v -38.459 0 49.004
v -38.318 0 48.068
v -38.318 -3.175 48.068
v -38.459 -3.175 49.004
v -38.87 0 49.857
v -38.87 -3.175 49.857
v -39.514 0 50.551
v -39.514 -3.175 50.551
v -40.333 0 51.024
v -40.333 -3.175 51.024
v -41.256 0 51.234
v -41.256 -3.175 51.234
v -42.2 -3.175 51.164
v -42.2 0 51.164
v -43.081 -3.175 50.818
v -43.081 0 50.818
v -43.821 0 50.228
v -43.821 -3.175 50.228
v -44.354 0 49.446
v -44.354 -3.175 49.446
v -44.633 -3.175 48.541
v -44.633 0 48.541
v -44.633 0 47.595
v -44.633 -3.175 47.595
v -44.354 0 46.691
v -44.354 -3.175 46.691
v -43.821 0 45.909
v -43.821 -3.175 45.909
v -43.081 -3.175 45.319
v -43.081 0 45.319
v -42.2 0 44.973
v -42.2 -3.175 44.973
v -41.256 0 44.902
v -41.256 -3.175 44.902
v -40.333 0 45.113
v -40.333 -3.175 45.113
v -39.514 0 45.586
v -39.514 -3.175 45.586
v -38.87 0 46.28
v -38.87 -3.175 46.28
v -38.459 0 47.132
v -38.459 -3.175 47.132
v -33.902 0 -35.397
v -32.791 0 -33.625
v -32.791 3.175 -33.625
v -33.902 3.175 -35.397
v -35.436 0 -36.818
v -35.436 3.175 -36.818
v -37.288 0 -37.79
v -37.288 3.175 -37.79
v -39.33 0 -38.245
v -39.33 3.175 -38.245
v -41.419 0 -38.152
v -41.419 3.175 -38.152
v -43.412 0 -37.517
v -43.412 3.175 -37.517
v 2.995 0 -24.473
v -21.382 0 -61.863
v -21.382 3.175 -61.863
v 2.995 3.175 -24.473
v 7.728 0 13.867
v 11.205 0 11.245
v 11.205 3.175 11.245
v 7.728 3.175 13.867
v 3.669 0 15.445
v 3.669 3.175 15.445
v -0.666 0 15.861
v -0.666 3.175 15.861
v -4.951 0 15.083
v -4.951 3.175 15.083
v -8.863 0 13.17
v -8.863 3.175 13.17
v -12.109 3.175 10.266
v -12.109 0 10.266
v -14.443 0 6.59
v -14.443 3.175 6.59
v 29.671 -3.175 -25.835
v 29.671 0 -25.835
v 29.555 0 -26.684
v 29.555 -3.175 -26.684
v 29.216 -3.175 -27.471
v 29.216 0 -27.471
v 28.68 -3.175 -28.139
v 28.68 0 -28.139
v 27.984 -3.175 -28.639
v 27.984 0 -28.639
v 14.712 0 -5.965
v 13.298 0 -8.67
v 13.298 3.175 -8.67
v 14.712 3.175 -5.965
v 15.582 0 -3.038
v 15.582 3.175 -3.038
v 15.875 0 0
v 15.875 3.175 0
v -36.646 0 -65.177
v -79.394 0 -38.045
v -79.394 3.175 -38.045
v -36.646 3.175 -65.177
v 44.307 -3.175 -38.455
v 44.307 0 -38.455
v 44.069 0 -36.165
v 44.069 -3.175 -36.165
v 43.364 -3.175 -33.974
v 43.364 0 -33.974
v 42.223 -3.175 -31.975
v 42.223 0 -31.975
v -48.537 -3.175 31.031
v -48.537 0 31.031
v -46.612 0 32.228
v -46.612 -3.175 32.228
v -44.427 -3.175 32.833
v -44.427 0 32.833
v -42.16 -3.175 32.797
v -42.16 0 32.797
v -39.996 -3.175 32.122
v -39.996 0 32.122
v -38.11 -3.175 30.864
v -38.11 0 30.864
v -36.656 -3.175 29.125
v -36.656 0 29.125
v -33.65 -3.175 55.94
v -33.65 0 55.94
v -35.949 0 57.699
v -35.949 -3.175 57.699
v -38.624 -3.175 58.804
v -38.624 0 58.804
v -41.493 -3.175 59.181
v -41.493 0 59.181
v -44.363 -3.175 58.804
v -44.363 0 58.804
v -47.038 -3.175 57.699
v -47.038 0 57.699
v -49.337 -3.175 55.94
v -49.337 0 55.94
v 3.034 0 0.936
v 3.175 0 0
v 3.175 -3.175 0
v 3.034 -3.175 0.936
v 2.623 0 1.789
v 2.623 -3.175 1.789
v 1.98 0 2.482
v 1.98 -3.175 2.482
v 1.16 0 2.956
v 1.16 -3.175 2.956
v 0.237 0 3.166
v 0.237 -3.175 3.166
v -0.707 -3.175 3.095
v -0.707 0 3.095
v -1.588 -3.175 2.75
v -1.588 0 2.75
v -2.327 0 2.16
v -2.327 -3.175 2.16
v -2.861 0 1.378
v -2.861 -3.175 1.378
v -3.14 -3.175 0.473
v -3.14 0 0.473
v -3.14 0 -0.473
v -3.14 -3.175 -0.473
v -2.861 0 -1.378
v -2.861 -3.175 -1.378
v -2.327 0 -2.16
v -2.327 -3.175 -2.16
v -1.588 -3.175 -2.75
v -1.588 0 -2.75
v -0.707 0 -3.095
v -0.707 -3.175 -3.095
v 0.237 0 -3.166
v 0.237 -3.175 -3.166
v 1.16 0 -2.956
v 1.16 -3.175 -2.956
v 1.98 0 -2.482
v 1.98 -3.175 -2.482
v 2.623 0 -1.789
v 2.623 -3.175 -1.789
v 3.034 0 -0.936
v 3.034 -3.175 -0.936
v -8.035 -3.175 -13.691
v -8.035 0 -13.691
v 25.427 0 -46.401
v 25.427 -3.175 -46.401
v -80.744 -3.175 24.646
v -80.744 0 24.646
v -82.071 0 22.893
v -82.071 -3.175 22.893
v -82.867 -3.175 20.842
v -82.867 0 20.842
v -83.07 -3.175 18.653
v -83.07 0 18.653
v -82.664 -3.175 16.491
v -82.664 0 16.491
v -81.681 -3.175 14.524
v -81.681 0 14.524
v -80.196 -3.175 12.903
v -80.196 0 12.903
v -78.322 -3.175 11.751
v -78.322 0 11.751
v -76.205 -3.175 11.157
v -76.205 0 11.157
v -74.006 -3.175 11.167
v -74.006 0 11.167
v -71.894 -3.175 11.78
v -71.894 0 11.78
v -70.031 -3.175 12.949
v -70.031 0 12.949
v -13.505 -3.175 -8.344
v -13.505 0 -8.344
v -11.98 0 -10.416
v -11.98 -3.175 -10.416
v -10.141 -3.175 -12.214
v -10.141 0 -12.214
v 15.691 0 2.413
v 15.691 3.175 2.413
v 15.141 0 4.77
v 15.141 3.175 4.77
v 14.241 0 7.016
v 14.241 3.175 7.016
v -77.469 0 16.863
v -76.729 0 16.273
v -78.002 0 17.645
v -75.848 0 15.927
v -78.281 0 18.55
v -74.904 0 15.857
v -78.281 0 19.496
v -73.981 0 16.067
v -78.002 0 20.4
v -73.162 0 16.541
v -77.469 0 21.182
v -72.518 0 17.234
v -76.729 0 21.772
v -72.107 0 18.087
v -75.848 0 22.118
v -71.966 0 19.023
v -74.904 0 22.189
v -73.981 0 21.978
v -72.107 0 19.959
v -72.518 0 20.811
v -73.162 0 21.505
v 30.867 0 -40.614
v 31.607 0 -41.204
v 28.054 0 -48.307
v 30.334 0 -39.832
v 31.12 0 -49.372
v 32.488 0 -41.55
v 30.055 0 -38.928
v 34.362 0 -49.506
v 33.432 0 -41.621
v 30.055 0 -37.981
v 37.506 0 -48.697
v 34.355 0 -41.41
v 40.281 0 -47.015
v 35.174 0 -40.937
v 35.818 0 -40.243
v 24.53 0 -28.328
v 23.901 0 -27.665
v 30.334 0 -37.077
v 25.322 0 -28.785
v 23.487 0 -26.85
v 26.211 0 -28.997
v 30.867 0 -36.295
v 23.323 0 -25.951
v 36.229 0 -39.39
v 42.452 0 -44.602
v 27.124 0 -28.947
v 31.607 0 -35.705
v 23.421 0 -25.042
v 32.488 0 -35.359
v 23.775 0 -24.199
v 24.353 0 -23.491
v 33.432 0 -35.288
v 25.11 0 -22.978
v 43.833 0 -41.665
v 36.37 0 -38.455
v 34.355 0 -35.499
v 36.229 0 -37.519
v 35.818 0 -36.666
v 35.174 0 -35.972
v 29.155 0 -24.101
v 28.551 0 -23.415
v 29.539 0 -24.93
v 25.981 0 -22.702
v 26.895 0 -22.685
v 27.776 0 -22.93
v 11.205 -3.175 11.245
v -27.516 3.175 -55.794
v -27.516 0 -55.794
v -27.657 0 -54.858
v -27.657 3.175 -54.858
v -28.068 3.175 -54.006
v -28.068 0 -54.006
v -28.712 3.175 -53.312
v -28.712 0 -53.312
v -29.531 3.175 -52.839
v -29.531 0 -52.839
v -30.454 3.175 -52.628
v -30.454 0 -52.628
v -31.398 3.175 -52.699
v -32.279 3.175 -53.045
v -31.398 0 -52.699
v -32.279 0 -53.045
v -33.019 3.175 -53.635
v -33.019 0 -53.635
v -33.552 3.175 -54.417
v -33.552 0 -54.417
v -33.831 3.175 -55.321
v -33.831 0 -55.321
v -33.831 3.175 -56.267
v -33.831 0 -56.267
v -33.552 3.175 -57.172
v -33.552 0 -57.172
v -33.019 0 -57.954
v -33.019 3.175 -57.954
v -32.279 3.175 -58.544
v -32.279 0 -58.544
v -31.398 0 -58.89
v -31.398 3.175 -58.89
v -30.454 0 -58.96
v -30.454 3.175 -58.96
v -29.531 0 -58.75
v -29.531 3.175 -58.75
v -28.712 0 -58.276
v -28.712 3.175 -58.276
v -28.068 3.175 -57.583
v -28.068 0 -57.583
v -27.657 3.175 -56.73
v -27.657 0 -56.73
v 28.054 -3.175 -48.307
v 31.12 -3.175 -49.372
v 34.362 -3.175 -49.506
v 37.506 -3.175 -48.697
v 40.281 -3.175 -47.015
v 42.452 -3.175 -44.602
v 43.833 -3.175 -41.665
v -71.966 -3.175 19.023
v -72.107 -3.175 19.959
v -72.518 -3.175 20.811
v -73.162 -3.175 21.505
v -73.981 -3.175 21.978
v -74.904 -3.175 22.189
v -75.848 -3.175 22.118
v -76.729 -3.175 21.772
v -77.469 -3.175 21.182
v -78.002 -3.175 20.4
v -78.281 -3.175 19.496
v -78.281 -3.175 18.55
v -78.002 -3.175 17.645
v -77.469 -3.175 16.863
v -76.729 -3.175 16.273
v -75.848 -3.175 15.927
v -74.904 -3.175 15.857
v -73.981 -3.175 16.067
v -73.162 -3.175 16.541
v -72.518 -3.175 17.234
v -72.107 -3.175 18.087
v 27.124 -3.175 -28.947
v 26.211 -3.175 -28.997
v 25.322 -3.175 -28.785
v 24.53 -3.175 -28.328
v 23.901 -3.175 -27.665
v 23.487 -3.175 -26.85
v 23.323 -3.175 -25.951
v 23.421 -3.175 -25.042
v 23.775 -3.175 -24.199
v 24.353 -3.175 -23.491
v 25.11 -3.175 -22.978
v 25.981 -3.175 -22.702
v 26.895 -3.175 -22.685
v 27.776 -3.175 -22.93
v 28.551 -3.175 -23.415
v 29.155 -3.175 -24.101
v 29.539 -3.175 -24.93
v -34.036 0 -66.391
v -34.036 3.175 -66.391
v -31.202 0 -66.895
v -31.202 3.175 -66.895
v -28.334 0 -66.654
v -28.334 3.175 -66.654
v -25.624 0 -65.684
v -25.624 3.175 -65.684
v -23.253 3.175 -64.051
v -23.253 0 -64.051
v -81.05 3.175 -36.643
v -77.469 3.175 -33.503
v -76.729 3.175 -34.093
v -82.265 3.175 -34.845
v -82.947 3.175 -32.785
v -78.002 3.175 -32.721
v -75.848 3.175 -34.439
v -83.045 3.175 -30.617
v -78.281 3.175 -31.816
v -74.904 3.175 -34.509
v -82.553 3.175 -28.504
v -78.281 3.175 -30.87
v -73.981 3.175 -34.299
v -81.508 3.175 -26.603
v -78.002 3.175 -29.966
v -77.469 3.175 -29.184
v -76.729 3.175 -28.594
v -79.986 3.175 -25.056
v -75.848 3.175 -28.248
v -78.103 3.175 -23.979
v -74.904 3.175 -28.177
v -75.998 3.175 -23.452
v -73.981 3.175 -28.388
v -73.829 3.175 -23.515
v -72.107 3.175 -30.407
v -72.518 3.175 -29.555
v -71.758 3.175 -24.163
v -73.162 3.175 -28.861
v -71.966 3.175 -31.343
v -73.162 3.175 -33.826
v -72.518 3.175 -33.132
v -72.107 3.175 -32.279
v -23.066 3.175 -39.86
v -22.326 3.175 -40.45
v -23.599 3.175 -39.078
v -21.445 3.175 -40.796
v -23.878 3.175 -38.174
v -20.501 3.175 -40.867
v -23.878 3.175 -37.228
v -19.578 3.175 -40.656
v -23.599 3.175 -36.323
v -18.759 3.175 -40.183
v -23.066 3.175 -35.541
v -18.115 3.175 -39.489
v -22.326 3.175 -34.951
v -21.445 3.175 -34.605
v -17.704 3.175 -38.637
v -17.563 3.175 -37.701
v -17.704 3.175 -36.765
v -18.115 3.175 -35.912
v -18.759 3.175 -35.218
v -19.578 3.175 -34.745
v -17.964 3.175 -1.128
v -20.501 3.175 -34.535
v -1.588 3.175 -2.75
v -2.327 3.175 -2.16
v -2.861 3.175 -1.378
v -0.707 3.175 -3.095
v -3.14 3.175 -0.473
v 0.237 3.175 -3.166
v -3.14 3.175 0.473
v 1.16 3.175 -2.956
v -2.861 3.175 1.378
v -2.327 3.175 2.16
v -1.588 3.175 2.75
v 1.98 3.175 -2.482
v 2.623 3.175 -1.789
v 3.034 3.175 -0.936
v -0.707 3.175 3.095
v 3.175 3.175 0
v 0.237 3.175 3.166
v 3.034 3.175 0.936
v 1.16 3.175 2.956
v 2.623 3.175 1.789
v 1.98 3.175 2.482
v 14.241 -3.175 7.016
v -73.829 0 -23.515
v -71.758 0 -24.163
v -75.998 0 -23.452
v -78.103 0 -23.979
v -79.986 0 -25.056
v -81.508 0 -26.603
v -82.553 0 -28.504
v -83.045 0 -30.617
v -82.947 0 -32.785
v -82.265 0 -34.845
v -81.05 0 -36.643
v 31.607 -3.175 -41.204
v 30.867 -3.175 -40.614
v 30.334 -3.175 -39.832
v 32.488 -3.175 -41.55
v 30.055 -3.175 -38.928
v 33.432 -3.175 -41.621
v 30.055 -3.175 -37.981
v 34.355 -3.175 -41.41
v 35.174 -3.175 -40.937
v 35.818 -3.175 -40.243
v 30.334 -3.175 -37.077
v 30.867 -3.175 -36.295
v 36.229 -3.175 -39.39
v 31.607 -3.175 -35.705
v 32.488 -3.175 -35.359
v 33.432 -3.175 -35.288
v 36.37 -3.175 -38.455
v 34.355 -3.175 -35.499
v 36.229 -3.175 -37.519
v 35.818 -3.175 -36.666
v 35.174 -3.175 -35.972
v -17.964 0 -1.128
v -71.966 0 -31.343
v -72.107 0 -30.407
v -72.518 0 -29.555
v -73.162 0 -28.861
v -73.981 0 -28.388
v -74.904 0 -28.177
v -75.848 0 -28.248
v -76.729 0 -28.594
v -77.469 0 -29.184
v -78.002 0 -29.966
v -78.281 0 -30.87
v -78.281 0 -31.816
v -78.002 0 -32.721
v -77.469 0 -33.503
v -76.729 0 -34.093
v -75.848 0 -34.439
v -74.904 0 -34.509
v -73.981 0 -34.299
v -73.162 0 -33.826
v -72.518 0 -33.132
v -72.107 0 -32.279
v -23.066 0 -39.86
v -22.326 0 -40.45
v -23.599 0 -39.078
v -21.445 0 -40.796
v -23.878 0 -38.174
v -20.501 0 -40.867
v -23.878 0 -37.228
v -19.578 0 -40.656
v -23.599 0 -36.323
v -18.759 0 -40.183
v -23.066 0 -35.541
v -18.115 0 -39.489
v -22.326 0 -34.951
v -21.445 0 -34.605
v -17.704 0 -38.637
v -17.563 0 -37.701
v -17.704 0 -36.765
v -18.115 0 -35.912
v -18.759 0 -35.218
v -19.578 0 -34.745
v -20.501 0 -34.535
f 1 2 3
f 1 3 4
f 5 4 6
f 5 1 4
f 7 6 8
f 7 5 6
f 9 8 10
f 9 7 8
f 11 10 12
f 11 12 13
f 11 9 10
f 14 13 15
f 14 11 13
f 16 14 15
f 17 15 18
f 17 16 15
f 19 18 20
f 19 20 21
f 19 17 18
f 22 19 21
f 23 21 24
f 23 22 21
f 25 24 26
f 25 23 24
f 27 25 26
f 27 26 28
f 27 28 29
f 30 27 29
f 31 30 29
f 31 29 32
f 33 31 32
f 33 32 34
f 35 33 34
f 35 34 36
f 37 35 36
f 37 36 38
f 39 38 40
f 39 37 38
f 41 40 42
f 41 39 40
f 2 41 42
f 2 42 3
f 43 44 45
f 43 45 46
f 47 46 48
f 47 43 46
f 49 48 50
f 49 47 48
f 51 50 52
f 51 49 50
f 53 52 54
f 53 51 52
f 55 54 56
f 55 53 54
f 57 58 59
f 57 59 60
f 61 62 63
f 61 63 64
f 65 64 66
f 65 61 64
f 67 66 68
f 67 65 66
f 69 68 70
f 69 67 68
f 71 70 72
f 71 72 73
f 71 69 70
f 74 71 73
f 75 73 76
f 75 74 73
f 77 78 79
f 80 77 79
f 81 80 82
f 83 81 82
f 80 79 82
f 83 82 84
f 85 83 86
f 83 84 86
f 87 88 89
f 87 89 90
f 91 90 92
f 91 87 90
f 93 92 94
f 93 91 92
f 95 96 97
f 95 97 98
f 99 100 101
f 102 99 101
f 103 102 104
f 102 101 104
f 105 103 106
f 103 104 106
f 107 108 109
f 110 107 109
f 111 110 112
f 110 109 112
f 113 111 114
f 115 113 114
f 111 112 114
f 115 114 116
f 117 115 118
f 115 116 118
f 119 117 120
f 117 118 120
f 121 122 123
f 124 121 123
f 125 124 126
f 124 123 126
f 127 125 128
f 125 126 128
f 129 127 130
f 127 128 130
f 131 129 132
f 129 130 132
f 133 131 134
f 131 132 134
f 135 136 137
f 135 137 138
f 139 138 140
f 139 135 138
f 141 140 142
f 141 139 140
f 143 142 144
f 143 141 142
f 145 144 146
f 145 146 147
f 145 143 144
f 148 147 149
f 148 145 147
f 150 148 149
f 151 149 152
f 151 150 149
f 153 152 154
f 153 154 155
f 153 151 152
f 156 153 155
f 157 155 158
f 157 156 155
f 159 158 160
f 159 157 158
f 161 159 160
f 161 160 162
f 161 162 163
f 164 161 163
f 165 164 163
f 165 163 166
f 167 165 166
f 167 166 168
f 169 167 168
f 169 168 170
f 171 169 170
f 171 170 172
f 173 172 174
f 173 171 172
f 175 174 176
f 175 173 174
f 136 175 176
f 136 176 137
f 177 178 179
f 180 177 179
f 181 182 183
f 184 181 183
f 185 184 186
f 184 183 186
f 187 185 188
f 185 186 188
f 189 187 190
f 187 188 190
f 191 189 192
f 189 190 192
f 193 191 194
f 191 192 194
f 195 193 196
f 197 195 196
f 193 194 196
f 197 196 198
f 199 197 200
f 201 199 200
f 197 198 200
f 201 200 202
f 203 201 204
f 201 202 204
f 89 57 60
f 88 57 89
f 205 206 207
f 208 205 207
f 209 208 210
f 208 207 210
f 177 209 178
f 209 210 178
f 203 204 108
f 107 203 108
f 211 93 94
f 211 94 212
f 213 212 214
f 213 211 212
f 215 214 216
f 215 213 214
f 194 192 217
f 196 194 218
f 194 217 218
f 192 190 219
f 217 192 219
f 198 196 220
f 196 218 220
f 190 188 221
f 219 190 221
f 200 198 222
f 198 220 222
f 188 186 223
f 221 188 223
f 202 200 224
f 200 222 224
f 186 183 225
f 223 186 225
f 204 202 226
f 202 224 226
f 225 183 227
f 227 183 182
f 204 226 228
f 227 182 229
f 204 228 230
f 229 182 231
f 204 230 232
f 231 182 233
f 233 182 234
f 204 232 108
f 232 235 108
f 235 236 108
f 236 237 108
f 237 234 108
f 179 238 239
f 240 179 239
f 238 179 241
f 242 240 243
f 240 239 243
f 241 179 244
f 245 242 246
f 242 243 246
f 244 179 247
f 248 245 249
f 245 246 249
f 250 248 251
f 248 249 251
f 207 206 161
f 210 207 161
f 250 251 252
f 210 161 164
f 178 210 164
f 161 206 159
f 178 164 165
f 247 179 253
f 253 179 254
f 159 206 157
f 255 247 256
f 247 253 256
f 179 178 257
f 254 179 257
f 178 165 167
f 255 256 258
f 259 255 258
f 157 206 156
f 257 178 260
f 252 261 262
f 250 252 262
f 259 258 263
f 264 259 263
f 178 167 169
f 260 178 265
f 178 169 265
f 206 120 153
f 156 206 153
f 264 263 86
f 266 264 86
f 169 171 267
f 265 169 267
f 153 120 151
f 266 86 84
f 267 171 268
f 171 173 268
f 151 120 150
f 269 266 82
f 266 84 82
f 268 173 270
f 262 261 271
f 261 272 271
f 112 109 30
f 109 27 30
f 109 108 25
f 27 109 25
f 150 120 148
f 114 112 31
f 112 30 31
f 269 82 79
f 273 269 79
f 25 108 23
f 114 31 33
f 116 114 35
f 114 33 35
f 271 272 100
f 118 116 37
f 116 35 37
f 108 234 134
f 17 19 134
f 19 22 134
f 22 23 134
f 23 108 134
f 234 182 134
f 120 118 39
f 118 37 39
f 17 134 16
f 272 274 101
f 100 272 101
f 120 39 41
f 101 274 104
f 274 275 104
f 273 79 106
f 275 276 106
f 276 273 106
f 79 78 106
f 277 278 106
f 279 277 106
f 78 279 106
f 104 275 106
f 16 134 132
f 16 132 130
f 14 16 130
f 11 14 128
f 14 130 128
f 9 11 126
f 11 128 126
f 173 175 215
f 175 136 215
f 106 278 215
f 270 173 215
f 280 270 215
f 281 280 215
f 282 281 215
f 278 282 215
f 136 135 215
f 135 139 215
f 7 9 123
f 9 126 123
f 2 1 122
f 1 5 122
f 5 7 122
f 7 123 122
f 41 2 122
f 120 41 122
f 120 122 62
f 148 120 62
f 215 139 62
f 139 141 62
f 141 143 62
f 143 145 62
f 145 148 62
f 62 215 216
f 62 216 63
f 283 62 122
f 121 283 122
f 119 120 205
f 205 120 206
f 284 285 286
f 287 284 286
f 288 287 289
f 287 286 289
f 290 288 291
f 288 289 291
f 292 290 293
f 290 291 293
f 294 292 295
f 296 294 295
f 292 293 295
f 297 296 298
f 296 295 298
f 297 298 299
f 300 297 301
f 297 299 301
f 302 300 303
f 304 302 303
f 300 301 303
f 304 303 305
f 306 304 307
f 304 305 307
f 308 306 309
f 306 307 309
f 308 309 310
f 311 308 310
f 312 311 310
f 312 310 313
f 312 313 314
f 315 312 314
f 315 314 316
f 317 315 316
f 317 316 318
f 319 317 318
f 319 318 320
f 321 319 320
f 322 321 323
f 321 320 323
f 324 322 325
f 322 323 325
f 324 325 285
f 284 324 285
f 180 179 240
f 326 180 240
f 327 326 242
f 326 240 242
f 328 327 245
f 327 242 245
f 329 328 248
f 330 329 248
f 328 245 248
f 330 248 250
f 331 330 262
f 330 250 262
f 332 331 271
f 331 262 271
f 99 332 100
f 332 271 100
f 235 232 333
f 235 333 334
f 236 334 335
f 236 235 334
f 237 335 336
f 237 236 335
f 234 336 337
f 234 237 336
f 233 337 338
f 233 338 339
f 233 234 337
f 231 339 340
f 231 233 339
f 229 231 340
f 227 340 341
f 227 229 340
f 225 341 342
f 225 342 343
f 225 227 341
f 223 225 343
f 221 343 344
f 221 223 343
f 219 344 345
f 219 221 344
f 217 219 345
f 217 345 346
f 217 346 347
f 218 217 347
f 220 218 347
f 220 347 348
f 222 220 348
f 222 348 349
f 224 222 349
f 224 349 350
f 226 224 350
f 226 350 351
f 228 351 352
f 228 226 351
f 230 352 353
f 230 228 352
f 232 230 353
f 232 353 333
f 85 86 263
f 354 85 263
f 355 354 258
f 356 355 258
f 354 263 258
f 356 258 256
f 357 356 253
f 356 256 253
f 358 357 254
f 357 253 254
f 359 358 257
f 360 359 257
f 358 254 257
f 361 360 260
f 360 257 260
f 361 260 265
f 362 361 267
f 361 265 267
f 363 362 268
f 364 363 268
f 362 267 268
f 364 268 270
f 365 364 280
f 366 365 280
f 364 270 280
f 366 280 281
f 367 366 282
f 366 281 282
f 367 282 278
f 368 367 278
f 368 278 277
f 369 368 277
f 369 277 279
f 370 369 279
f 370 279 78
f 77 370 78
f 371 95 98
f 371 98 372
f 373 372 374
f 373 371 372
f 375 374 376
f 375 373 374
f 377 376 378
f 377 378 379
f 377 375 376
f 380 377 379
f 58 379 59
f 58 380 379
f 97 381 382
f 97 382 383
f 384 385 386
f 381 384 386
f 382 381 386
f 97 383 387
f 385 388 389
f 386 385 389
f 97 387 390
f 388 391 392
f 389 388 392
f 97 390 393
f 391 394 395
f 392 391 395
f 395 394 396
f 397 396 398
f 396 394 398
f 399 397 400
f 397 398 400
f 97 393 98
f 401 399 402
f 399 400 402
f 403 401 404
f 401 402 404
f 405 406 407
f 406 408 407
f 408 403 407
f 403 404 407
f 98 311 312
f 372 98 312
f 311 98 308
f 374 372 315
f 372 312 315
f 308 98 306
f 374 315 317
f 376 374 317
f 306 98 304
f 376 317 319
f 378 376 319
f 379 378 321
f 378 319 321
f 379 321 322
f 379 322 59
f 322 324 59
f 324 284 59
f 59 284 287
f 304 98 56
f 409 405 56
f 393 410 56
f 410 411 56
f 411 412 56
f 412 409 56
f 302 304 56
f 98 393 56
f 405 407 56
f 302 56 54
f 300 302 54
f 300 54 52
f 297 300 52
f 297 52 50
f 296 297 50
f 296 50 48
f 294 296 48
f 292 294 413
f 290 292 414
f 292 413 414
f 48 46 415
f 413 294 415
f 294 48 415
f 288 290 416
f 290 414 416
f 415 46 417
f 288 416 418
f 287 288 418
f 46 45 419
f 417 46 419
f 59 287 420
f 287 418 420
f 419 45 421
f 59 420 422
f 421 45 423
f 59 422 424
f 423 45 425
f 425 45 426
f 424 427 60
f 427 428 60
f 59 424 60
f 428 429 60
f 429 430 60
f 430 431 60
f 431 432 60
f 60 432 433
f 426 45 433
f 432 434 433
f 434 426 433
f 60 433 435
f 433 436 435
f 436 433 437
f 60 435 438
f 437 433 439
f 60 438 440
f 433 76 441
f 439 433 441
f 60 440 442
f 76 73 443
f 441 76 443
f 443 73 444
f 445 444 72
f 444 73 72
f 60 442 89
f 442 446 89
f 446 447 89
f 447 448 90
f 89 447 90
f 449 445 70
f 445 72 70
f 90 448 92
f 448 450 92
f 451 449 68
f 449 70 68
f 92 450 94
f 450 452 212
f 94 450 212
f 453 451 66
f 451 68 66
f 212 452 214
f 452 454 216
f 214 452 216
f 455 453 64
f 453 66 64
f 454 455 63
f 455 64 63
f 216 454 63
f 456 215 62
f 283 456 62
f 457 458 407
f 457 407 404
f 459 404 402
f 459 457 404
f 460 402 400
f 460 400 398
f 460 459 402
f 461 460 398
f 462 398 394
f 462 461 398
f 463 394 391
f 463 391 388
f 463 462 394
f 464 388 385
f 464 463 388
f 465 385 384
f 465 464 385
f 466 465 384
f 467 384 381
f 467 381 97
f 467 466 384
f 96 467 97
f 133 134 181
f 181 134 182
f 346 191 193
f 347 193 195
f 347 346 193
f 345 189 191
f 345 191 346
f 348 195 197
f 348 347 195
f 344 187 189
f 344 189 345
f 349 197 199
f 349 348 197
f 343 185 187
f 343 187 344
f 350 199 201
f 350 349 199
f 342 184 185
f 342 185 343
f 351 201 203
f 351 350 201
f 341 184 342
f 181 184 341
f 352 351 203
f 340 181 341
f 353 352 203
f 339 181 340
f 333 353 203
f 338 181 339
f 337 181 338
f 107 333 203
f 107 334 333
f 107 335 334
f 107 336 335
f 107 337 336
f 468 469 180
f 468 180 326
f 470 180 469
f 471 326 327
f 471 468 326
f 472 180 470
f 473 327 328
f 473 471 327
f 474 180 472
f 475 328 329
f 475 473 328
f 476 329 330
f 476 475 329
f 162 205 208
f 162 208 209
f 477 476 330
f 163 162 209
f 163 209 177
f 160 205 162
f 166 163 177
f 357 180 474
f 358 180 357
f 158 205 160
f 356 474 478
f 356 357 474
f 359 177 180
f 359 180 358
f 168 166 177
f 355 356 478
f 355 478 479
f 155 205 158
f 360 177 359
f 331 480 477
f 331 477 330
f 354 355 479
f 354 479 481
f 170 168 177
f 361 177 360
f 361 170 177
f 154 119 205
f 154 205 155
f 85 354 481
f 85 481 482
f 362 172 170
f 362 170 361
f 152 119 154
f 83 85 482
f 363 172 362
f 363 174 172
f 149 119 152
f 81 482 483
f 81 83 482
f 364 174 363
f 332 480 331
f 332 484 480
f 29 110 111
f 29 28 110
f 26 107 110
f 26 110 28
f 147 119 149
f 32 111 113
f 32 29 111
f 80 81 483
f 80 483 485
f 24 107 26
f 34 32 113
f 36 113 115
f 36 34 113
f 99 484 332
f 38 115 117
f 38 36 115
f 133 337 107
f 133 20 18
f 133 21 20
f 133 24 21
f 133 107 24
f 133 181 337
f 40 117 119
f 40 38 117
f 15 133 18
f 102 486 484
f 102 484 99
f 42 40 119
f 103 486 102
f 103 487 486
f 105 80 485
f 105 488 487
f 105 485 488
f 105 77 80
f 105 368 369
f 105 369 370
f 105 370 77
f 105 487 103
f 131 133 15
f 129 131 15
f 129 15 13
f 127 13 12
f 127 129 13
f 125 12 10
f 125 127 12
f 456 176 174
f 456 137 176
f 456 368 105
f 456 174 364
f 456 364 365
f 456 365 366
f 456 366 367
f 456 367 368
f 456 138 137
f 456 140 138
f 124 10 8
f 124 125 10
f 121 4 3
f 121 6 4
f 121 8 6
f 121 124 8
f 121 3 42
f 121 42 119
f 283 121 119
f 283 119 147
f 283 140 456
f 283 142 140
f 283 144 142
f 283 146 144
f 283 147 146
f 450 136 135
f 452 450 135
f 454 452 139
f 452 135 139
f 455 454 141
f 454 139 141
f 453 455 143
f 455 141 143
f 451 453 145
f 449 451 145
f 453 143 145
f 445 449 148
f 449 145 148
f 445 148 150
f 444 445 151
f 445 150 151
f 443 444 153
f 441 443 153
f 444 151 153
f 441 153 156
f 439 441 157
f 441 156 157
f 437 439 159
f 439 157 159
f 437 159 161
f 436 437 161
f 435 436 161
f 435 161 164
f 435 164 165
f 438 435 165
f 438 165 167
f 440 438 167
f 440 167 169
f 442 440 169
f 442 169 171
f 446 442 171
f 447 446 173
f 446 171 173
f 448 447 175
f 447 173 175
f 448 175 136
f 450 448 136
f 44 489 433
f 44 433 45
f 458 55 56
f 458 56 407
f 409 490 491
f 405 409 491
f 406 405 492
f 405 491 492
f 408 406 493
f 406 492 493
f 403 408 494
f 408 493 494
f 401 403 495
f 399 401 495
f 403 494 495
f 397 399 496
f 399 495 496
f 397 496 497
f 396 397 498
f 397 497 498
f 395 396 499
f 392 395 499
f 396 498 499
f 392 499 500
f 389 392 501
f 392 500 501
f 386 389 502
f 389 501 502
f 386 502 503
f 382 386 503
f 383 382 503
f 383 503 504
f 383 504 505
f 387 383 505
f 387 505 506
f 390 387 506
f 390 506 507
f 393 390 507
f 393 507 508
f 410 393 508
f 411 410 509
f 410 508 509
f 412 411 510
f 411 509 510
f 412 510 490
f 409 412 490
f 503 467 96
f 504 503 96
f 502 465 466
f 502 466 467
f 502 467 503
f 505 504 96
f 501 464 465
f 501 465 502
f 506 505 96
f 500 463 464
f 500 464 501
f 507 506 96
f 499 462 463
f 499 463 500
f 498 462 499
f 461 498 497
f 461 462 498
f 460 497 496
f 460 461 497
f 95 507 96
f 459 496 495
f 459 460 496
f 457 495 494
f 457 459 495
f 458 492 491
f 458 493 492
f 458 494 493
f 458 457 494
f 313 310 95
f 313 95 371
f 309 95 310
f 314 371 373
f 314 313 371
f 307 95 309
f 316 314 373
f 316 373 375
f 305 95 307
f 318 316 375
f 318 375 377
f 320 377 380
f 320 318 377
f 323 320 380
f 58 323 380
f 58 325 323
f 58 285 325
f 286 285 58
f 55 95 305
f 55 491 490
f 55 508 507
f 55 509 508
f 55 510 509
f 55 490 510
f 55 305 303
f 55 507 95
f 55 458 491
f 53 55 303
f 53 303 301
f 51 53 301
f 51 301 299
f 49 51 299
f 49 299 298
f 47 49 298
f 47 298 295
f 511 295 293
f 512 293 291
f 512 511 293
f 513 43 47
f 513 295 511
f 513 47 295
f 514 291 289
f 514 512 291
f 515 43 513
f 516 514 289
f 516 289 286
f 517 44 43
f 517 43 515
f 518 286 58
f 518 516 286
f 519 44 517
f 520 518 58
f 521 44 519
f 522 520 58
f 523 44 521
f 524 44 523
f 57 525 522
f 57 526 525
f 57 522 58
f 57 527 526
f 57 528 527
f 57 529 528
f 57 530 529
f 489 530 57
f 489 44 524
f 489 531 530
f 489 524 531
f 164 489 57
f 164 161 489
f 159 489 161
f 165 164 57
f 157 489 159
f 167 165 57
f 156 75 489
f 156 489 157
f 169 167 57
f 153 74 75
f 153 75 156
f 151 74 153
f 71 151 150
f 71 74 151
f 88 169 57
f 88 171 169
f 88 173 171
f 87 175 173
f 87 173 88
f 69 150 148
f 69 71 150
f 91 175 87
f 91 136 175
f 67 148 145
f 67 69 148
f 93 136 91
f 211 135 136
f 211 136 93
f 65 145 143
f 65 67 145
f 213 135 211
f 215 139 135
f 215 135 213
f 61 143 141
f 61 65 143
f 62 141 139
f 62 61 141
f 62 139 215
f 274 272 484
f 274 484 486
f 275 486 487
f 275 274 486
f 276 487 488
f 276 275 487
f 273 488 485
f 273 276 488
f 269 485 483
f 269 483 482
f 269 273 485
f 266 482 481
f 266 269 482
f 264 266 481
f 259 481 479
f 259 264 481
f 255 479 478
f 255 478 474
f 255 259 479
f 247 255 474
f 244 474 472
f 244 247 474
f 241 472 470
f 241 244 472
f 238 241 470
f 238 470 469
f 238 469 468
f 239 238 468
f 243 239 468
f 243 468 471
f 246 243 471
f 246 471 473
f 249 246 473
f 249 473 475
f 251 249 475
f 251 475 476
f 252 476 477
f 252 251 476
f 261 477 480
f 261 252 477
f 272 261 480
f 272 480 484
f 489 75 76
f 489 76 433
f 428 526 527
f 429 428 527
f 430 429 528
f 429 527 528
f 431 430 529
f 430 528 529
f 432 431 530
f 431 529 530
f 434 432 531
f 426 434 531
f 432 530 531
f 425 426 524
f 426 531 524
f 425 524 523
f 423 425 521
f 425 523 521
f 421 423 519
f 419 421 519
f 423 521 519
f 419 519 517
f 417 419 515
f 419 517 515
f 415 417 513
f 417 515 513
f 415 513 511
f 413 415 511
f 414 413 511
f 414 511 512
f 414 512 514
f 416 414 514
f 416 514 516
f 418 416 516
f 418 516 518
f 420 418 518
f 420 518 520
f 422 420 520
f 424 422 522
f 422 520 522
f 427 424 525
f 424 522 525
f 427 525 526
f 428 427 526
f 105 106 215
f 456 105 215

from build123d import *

# Parameters (mm, degrees)
F0_R     = 3.9751
F0_R_2   = 3.175
F1_DEPTH = 3.175
F2_DEPTH = 3.175


with BuildPart() as f1:
    # F0 (on Front) → F1 (new body)
    with BuildSketch(Plane.XZ):
        with BuildLine():
            ThreePointArc((-14.4427573847, 6.589566308), (-2.8354258051, 15.6197306476), (11.2052030012, 11.2454013135))
            Line((11.2052030012, 11.2454013135), (-33.6497130803, 55.9399770143))
            ThreePointArc((-33.6497130803, 55.9399770143), (-31.2305551467, 52.3299553211), (-30.3808551811, 48.0681960948))
            ThreePointArc((-30.3808551811, 48.0681960948), (-45.7551144074, 37.8053960604), (-49.336997282, 55.9399770143))
            Line((-49.336997282, 55.9399770143), (-80.7436939481, 24.6455481248))
            ThreePointArc((-80.7436939481, 24.6455481248), (-72.0969787145, 26.3534189212), (-67.2035924475, 19.022847468))
            ThreePointArc((-67.2035924475, 19.022847468), (-67.945184229, 15.6728010265), (-70.0313873855, 12.9487367982))
            Line((-70.0313873855, 12.9487367982), (-48.5368082432, 31.0305541734))
            ThreePointArc((-48.5368082432, 31.0305541734), (-42.1602348474, 32.7966531084), (-36.6555025797, 29.1254521629))
            Line((-36.6555025797, 29.1254521629), (-17.9638112387, -1.1277437812))
            Line((-17.9638112387, -1.1277437812), (-14.4427573847, 6.589566308))
        make_face()
        with BuildLine():
            Line((14.2405382677, 7.0158887425), (11.2052030012, 11.2454013135))
            ThreePointArc((11.2052030012, 11.2454013135), (-2.8354258051, 15.6197306476), (-14.4427573847, 6.589566308))
            ThreePointArc((-14.4427573847, 6.589566308), (-15.843809219, -0.9946529208), (-13.50524176, -8.3441039066))
            Line((-13.50524176, -8.3441039066), (-8.0349928898, -13.6914029325))
            ThreePointArc((-8.0349928898, -13.6914029325), (3.6371425128, -15.4527285404), (13.2982791082, -8.670144045))
            ThreePointArc((13.2982791082, -8.670144045), (15.2171910326, -4.5224685824), (15.875, 0))
            ThreePointArc((15.875, 0), (15.4609859, 3.6018800647), (14.2405382677, 7.0158887425))
        make_face()
        Circle(F0_R, mode=Mode.SUBTRACT)
        with BuildLine():
            ThreePointArc((-30.3808551811, 48.0681960948), (-31.2305551467, 52.3299553211), (-33.6497130803, 55.9399770143))
            ThreePointArc((-33.6497130803, 55.9399770143), (-41.4933551811, 59.1806960948), (-49.336997282, 55.9399770143))
            ThreePointArc((-49.336997282, 55.9399770143), (-45.7551144074, 37.8053960604), (-30.3808551811, 48.0681960948))
        make_face()
        with Locations((-41.4933551811, 48.0681960948)):
            Circle(F0_R_2, mode=Mode.SUBTRACT)
        with BuildLine():
            ThreePointArc((-67.2035924475, 19.022847468), (-72.0969787145, 26.3534189212), (-80.7436939481, 24.6455481248))
            ThreePointArc((-80.7436939481, 24.6455481248), (-80.9946883959, 13.6619407609), (-70.0313873855, 12.9487367982))
            ThreePointArc((-70.0313873855, 12.9487367982), (-67.945184229, 15.6728010265), (-67.2035924475, 19.022847468))
        make_face()
        with Locations((-75.1410924475, 19.022847468)):
            Circle(F0_R_2, mode=Mode.SUBTRACT)
        Circle(F0_R)
        Circle(F0_R_2, mode=Mode.SUBTRACT)
        with BuildLine():
            ThreePointArc((-13.50524176, -8.3441039066), (-15.843809219, -0.9946529208), (-14.4427573847, 6.589566308))
            Line((-14.4427573847, 6.589566308), (-17.9638112387, -1.1277437812))
            Line((-17.9638112387, -1.1277437812), (-13.50524176, -8.3441039066))
        make_face()
        with BuildLine():
            ThreePointArc((13.2982791082, -8.670144045), (3.6371425128, -15.4527285404), (-8.0349928898, -13.6914029325))
            Line((-8.0349928898, -13.6914029325), (2.994937632, -24.4734236659))
            Line((2.994937632, -24.4734236659), (13.2982791082, -8.670144045))
        make_face()
        with BuildLine():
            Line((42.2228832649, -31.9754151966), (14.2405382677, 7.0158887425))
            ThreePointArc((14.2405382677, 7.0158887425), (15.4609859, 3.6018800647), (15.875, 0))
            ThreePointArc((15.875, 0), (15.2171910326, -4.5224685824), (13.2982791082, -8.670144045))
            Line((13.2982791082, -8.670144045), (2.994937632, -24.4734236659))
            Line((2.994937632, -24.4734236659), (25.4267709009, -46.4010768742))
            ThreePointArc((25.4267709009, -46.4010768742), (22.1956165639, -36.8708370147), (27.9842277894, -28.6393237753))
            ThreePointArc((27.9842277894, -28.6393237753), (35.7296725959, -27.6350610557), (42.2228832649, -31.9754151966))
        make_face()
        with BuildLine():
            ThreePointArc((29.670526099, -25.8349713944), (29.2164866708, -27.4711249832), (27.9842277894, -28.6393237753))
            ThreePointArc((27.9842277894, -28.6393237753), (23.7745655271, -24.1988178055), (29.670526099, -25.8349713944))
        make_face(mode=Mode.SUBTRACT)
        with BuildLine():
            ThreePointArc((44.3071841449, -38.4545568759), (43.7732832717, -35.0514852098), (42.2228832649, -31.9754151966))
            ThreePointArc((42.2228832649, -31.9754151966), (35.7296725959, -27.6350610557), (27.9842277894, -28.6393237753))
            ThreePointArc((27.9842277894, -28.6393237753), (22.1956165639, -36.8708370147), (25.4267709009, -46.4010768742))
            ThreePointArc((25.4267709009, -46.4010768742), (37.5055263089, -48.6968367044), (44.3071841449, -38.4545568759))
        make_face()
        with Locations((33.1946841449, -38.4545568759)):
            Circle(F0_R_2, mode=Mode.SUBTRACT)
        with BuildLine():
            Line((-8.0349928898, -13.6914029325), (-13.50524176, -8.3441039066))
            ThreePointArc((-13.50524176, -8.3441039066), (-11.09701892, -11.3521714262), (-8.0349928898, -13.6914029325))
        make_face()
    extrude(amount=F1_DEPTH)


with BuildPart() as f2:
    # F0 (on Front) → F2 (new body)
    with BuildSketch(Plane.XZ):
        with BuildLine():
            ThreePointArc((-8.0349928898, -13.6914029325), (-11.09701892, -11.3521714262), (-13.50524176, -8.3441039066))
            Line((-13.50524176, -8.3441039066), (-17.9638112387, -1.1277437812))
            Line((-17.9638112387, -1.1277437812), (-32.7908689101, -33.6251171539))
            ThreePointArc((-32.7908689101, -33.6251171539), (-37.2884482799, -37.7898812405), (-43.412095928, -37.5170817433))
            Line((-43.412095928, -37.5170817433), (-71.7582109383, -24.1626996834))
            ThreePointArc((-71.7582109383, -24.1626996834), (-68.4382748225, -27.0916255768), (-67.2035924475, -31.343230231))
            ThreePointArc((-67.2035924475, -31.343230231), (-71.3173170081, -38.2989938583), (-79.3944957896, -38.0449066078))
            Line((-79.3944957896, -38.0449066078), (-36.6458571264, -65.1765065738))
            ThreePointArc((-36.6458571264, -65.1765065738), (-36.0443780627, -46.056090568), (-19.5785924475, -55.7941596462))
            ThreePointArc((-19.5785924475, -55.7941596462), (-20.0390587247, -58.9598876539), (-21.3822970718, -61.8632604777))
            Line((-21.3822970718, -61.8632604777), (2.994937632, -24.4734236659))
            Line((2.994937632, -24.4734236659), (-8.0349928898, -13.6914029325))
        make_face()
        with Locations((-20.7383021526, -37.7007153808)):
            Circle(F0_R_2, mode=Mode.SUBTRACT)
        with BuildLine():
            ThreePointArc((13.2982791082, -8.670144045), (3.6371425128, -15.4527285404), (-8.0349928898, -13.6914029325))
            Line((-8.0349928898, -13.6914029325), (2.994937632, -24.4734236659))
            Line((2.994937632, -24.4734236659), (13.2982791082, -8.670144045))
        make_face()
        with BuildLine():
            Line((14.2405382677, 7.0158887425), (11.2052030012, 11.2454013135))
            ThreePointArc((11.2052030012, 11.2454013135), (-2.8354258051, 15.6197306476), (-14.4427573847, 6.589566308))
            ThreePointArc((-14.4427573847, 6.589566308), (-15.843809219, -0.9946529208), (-13.50524176, -8.3441039066))
            Line((-13.50524176, -8.3441039066), (-8.0349928898, -13.6914029325))
            ThreePointArc((-8.0349928898, -13.6914029325), (3.6371425128, -15.4527285404), (13.2982791082, -8.670144045))
            ThreePointArc((13.2982791082, -8.670144045), (15.2171910326, -4.5224685824), (15.875, 0))
            ThreePointArc((15.875, 0), (15.4609859, 3.6018800647), (14.2405382677, 7.0158887425))
        make_face()
        Circle(F0_R, mode=Mode.SUBTRACT)
        with BuildLine():
            ThreePointArc((-36.6458571264, -65.1765065738), (-28.3338100287, -66.6537579743), (-21.3822970718, -61.8632604777))
            ThreePointArc((-21.3822970718, -61.8632604777), (-20.0390587247, -58.9598876539), (-19.5785924475, -55.7941596462))
            ThreePointArc((-19.5785924475, -55.7941596462), (-36.0443780627, -46.056090568), (-36.6458571264, -65.1765065738))
        make_face()
        with Locations((-30.6910924475, -55.7941596462)):
            Circle(F0_R_2, mode=Mode.SUBTRACT)
        with BuildLine():
            ThreePointArc((-67.2035924475, -31.343230231), (-68.4382748225, -27.0916255768), (-71.7582109383, -24.1626996834))
            ThreePointArc((-71.7582109383, -24.1626996834), (-82.0958296344, -27.5175882049), (-79.3944957896, -38.0449066078))
            ThreePointArc((-79.3944957896, -38.0449066078), (-71.3173170081, -38.2989938583), (-67.2035924475, -31.343230231))
        make_face()
        with Locations((-75.1410924475, -31.343230231)):
            Circle(F0_R_2, mode=Mode.SUBTRACT)
        with BuildLine():
            ThreePointArc((-13.50524176, -8.3441039066), (-15.843809219, -0.9946529208), (-14.4427573847, 6.589566308))
            Line((-14.4427573847, 6.589566308), (-17.9638112387, -1.1277437812))
            Line((-17.9638112387, -1.1277437812), (-13.50524176, -8.3441039066))
        make_face()
        with BuildLine():
            Line((-8.0349928898, -13.6914029325), (-13.50524176, -8.3441039066))
            ThreePointArc((-13.50524176, -8.3441039066), (-11.09701892, -11.3521714262), (-8.0349928898, -13.6914029325))
        make_face()
        Circle(F0_R)
        Circle(F0_R_2, mode=Mode.SUBTRACT)
    extrude(amount=-F2_DEPTH)


solid = Compound([f1.part, f2.part])
